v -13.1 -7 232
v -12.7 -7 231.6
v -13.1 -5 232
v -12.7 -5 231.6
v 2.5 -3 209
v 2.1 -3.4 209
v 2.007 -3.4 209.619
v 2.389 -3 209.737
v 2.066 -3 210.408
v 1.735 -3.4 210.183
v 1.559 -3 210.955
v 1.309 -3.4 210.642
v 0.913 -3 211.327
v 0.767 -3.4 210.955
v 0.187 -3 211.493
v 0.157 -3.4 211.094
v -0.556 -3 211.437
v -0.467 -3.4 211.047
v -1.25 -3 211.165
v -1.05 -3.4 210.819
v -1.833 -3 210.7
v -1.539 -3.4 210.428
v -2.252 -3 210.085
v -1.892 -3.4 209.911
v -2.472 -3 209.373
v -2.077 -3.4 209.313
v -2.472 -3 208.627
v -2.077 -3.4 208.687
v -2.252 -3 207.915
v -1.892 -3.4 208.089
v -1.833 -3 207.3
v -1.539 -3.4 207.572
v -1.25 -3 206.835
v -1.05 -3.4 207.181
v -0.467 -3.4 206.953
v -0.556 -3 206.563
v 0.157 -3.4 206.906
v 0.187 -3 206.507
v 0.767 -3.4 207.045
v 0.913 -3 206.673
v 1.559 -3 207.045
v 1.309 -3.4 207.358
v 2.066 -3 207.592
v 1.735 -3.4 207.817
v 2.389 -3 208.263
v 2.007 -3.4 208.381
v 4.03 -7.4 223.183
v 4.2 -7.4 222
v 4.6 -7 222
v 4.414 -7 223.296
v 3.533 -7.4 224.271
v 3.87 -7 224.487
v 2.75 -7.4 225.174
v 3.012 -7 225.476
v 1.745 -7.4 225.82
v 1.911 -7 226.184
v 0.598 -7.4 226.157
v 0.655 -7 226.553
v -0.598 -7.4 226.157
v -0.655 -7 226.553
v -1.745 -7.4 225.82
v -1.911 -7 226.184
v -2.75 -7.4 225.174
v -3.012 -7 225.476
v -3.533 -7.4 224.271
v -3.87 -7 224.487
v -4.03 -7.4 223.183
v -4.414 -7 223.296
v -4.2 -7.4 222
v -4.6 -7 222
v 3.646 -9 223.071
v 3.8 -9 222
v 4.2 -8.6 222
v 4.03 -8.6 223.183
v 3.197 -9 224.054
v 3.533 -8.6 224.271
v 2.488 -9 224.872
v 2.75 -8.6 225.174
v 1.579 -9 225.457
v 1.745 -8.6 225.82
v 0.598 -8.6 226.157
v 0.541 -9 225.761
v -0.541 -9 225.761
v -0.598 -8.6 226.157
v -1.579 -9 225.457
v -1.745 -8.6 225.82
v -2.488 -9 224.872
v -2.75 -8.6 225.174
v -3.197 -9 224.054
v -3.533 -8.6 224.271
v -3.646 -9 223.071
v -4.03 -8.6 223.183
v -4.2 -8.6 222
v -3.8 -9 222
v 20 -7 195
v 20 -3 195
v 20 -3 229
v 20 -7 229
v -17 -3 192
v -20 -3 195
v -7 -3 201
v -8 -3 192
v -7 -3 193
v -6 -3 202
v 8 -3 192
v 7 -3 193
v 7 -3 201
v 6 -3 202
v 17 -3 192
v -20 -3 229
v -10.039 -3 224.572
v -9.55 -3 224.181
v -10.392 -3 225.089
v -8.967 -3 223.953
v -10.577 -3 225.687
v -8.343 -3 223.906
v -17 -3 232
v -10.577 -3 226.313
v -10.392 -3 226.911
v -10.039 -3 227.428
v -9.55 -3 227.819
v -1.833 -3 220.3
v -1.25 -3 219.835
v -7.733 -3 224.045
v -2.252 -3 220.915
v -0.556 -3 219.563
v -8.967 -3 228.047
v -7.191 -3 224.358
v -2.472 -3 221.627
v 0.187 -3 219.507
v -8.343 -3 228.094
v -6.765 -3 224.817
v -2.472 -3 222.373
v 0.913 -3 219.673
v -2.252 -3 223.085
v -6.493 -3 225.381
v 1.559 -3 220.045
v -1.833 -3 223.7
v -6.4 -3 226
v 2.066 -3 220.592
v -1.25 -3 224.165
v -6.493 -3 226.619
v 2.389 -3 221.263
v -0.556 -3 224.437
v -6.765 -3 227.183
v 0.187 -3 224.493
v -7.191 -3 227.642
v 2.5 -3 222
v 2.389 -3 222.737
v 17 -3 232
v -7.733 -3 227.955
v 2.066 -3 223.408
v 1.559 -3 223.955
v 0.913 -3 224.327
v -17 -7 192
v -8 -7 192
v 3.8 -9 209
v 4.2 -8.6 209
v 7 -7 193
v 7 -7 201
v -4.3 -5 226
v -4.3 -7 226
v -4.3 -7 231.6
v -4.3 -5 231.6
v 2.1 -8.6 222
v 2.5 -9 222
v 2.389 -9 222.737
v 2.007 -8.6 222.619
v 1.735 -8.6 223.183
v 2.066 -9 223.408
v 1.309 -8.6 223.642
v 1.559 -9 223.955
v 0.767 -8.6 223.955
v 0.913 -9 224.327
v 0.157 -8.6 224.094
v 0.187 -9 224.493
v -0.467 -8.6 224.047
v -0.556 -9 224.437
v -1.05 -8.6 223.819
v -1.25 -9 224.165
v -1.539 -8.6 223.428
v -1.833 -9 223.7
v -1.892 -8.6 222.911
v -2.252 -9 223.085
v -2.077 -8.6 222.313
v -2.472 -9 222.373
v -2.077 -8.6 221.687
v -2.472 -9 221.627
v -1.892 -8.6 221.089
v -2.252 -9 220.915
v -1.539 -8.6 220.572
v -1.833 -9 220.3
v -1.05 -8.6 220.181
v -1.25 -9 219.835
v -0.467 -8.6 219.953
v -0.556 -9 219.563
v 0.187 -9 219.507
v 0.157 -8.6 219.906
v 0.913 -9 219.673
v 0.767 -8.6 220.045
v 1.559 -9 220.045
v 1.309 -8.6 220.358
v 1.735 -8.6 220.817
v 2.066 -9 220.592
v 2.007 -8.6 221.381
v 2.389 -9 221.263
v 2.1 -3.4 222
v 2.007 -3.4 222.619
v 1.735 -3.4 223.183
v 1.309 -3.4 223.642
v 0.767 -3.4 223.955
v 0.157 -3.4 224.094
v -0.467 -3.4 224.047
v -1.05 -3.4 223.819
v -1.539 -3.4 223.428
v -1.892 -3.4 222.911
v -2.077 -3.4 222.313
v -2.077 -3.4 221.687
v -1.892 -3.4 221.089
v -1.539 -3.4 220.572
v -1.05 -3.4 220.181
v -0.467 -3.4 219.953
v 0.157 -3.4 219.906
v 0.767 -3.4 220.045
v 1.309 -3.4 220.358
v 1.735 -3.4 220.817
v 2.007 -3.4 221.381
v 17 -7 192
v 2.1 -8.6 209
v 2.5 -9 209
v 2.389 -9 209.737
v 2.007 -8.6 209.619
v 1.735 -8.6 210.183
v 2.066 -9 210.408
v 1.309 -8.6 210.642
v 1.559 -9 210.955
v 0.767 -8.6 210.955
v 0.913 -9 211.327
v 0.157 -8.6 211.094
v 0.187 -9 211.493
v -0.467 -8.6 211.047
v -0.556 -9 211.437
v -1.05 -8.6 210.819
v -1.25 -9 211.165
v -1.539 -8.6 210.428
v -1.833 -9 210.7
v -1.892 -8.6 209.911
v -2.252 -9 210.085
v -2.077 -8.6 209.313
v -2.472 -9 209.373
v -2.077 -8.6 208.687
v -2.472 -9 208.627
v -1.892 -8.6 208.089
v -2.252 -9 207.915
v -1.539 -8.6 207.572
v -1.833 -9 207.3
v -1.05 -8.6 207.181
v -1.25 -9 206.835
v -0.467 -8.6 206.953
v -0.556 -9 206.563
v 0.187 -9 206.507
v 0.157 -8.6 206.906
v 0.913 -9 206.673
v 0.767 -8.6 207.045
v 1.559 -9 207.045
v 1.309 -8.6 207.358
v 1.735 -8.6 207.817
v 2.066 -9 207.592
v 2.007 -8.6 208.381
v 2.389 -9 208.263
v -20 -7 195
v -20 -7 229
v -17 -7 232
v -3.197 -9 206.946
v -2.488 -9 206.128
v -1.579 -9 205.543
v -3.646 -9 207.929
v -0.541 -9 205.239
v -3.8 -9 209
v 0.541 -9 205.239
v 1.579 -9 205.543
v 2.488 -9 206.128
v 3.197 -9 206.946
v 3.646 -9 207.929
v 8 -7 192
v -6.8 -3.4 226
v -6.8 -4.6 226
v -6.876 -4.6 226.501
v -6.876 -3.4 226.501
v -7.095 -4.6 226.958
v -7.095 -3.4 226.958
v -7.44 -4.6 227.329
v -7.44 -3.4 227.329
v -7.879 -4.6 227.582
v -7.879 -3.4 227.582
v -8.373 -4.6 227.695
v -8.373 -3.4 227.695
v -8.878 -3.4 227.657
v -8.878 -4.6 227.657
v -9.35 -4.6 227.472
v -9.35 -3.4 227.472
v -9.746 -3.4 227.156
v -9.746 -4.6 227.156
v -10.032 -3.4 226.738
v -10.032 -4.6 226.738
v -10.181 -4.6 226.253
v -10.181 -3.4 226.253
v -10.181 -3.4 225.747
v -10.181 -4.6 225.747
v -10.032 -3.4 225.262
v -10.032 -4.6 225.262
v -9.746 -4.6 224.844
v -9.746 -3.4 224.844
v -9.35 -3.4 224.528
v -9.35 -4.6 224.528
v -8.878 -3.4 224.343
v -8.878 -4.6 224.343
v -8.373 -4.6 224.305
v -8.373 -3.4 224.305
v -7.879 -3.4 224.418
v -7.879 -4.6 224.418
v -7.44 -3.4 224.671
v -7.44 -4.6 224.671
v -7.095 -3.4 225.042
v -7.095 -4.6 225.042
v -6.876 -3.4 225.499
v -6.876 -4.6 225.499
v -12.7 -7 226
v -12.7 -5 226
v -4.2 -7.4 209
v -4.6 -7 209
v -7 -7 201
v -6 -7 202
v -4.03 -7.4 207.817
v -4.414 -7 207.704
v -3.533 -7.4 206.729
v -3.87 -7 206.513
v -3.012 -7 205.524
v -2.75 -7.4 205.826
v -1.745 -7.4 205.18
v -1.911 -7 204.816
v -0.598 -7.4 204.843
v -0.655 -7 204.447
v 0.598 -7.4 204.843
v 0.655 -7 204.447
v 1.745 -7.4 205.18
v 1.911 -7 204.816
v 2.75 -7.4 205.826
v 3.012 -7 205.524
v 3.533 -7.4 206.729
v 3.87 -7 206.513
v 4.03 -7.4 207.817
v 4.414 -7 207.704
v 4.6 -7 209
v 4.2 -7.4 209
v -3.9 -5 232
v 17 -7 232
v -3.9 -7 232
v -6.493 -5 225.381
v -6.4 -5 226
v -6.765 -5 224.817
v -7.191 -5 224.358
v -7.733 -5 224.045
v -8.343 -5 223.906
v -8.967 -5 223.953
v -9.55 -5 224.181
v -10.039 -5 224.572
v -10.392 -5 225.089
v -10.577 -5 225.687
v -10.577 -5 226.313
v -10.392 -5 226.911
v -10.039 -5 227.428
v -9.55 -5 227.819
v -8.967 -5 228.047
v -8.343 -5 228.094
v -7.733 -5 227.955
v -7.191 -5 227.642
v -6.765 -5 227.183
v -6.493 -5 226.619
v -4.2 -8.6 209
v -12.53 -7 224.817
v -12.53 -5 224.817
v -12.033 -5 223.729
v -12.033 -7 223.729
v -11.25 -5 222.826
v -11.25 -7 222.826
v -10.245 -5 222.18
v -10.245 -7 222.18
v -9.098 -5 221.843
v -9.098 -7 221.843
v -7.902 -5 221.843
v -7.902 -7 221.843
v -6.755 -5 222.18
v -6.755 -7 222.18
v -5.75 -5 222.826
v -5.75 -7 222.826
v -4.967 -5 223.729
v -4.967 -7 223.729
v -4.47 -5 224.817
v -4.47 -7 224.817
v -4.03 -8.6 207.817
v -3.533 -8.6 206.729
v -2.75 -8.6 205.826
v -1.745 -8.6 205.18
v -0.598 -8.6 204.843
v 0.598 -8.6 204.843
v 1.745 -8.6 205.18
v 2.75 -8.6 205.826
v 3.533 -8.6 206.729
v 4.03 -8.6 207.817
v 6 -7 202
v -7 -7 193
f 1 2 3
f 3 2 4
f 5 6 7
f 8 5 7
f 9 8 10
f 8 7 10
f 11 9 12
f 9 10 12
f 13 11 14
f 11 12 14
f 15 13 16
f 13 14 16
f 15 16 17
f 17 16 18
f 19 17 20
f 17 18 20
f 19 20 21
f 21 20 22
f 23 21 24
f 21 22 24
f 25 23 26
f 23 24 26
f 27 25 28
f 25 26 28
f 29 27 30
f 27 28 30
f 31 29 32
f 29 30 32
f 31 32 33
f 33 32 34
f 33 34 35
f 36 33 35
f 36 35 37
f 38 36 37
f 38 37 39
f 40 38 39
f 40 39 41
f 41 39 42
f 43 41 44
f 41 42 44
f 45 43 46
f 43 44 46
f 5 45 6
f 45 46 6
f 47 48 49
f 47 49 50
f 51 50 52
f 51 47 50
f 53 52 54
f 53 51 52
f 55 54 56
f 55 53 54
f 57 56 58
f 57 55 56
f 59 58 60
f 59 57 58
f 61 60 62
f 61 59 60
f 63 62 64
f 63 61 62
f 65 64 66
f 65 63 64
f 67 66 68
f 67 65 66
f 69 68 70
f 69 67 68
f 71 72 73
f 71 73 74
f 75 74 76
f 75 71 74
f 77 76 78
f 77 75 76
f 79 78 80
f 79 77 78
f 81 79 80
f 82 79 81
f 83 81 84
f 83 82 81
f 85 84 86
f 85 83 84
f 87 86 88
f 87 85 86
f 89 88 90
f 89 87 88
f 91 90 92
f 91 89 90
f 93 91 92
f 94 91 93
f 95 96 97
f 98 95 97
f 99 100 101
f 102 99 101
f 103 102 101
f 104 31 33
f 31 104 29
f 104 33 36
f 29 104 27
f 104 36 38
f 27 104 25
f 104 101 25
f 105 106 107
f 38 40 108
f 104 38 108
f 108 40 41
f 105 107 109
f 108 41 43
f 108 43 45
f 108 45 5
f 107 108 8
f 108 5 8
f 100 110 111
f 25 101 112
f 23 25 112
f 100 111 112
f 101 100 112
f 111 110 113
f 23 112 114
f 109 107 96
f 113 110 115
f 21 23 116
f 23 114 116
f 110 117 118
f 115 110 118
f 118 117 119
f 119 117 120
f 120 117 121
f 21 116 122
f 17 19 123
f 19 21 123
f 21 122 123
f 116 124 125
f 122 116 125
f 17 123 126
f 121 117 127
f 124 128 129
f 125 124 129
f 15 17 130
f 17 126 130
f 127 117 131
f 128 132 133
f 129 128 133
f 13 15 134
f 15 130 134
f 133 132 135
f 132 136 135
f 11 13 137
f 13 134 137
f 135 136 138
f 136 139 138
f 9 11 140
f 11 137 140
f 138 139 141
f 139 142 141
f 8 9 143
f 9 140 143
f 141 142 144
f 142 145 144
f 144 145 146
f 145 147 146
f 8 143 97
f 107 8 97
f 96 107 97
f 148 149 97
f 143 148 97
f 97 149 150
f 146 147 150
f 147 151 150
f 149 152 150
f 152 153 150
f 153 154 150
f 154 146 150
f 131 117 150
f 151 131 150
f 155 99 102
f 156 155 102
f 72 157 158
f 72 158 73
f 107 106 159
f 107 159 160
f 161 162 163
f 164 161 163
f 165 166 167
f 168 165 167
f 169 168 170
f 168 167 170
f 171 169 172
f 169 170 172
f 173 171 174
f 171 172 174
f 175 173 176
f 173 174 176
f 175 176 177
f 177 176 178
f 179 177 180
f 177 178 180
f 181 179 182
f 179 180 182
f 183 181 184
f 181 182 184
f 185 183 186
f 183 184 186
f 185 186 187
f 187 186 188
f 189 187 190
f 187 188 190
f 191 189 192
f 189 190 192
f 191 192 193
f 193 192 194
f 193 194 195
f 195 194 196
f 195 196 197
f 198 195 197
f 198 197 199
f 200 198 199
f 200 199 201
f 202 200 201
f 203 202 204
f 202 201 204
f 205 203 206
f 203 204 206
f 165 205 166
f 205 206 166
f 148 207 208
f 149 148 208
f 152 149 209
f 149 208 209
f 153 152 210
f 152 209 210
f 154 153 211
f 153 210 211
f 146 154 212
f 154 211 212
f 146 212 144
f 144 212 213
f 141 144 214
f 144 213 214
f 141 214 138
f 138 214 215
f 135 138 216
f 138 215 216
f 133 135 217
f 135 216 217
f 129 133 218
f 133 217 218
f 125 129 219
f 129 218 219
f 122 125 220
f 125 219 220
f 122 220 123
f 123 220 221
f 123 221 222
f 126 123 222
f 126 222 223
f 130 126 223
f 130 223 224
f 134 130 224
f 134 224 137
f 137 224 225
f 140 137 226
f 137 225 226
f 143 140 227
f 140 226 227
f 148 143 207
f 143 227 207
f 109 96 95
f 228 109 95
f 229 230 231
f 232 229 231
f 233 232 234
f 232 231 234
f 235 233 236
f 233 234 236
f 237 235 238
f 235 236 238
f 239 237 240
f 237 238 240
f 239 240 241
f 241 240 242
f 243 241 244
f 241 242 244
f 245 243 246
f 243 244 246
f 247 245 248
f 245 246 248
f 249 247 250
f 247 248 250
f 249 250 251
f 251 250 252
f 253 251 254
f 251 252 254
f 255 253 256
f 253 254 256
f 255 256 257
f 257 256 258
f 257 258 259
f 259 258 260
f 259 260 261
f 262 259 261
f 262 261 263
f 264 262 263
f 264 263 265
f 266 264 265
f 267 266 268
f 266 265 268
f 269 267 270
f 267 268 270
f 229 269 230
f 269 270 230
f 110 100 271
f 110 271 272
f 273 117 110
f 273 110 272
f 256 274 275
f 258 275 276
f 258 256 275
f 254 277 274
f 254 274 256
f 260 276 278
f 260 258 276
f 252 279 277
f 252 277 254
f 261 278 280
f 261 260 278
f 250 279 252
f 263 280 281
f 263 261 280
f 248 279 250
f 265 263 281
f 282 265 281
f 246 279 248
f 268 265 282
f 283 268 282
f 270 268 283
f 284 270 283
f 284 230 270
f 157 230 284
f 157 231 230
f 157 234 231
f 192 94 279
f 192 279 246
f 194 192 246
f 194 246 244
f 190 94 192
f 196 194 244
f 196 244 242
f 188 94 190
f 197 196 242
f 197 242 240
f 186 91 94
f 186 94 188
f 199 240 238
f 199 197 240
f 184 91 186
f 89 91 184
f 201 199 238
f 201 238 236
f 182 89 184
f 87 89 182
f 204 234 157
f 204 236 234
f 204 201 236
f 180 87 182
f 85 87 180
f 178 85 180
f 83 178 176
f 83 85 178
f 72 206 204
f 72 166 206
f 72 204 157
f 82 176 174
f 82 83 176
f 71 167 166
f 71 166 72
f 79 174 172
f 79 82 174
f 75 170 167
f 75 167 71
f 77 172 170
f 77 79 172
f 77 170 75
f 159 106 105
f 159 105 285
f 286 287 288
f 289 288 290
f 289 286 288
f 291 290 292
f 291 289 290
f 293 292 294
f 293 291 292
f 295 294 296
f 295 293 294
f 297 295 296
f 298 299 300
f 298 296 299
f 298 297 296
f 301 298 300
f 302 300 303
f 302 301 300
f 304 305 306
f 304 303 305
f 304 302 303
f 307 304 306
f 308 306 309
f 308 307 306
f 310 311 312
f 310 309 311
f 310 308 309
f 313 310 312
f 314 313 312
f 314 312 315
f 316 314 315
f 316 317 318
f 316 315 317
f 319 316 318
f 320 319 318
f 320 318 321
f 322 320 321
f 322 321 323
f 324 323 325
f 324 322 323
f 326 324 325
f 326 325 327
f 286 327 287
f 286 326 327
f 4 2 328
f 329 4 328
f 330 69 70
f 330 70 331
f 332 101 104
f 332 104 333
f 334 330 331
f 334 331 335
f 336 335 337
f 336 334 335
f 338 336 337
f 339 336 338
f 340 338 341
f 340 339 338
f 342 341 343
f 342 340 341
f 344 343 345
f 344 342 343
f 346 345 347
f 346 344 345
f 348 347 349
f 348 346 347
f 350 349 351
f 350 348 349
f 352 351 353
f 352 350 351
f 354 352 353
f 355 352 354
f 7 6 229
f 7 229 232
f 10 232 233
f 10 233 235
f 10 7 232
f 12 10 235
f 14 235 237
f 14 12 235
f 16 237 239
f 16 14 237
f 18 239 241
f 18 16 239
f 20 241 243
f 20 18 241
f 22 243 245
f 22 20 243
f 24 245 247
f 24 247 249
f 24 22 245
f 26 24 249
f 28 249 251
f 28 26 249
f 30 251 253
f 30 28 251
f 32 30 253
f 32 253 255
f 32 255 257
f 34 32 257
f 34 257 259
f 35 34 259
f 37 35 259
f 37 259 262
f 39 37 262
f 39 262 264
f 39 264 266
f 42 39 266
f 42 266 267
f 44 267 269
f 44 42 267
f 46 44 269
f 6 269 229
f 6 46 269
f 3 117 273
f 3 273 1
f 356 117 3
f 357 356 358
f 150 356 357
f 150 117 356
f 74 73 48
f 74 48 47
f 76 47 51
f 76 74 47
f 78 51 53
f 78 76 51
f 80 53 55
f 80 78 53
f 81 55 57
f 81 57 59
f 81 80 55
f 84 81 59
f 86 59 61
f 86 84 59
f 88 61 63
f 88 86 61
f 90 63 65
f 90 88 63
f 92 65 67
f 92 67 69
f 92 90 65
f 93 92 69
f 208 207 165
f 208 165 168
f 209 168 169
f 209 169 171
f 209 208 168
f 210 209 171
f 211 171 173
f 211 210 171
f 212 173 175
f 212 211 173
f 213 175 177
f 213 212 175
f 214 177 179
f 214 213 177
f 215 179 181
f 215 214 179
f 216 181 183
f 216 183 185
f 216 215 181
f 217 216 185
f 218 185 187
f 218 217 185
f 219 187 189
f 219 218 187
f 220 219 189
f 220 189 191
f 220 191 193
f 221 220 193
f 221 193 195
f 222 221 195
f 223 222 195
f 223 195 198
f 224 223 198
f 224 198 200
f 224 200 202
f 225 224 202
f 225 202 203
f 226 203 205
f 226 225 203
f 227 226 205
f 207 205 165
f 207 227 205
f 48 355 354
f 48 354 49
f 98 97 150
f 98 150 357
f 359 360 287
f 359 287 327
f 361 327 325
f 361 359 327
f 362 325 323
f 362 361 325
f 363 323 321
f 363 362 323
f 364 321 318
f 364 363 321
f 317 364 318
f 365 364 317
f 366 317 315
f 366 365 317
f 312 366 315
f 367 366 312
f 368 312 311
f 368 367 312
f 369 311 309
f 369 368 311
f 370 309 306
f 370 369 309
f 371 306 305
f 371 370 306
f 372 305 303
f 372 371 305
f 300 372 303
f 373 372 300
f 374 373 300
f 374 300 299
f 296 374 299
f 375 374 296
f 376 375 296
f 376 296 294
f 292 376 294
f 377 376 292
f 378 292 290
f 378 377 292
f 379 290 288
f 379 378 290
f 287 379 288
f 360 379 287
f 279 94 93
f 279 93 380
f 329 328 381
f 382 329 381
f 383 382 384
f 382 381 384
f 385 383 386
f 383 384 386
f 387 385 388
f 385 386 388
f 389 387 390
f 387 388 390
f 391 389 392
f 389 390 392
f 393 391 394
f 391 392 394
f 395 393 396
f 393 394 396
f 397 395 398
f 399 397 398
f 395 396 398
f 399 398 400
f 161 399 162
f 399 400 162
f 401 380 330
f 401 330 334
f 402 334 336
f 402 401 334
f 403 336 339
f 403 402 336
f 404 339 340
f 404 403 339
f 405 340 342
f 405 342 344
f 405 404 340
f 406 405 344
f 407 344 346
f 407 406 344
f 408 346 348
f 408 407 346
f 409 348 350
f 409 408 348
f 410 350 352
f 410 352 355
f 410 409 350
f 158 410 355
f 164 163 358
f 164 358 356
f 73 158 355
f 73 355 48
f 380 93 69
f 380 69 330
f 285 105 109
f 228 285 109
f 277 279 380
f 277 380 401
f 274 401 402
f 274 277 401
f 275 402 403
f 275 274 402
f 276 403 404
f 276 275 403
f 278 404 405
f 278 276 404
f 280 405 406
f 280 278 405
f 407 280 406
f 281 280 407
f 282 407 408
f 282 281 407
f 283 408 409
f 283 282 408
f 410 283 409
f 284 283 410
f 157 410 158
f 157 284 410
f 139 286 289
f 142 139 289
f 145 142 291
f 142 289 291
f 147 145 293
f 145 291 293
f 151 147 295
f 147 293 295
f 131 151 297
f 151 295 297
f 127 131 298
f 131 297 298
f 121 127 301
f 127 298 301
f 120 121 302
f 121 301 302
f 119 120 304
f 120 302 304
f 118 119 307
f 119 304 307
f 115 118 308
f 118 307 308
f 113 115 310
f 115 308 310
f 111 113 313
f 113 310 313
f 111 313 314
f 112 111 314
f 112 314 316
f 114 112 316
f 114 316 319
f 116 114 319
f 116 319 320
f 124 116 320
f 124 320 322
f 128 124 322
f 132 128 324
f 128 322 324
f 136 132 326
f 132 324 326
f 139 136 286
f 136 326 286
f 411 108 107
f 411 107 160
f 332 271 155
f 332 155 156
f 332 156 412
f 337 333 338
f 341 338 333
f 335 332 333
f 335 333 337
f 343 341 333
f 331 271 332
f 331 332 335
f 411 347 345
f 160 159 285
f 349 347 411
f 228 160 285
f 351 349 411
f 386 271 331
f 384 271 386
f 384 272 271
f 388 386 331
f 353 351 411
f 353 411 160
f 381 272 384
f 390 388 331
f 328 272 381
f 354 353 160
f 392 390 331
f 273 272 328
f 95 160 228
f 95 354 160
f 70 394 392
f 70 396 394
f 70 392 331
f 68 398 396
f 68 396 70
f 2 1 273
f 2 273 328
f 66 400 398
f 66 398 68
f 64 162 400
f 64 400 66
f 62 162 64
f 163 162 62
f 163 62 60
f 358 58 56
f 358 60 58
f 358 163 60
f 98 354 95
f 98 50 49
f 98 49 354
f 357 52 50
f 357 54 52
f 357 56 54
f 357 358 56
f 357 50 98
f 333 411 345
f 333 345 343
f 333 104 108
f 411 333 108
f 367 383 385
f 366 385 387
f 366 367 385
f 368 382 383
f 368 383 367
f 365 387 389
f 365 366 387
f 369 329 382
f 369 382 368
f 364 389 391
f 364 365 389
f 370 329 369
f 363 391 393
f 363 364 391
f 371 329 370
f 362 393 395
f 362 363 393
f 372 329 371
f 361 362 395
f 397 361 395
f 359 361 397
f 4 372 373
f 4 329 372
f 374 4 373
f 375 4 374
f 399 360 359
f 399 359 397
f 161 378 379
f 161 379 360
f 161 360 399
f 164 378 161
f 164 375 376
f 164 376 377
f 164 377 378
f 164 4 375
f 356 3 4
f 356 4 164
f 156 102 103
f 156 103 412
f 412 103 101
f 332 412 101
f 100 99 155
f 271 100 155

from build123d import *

# Parameters (mm, degrees)
SKETCH120_W     = 40
SKETCH120_H     = 40
SKETCH120_R     = 1.7
SKETCH120_R_2   = 2.1
PAD062_DEPTH    = 6
CHAMFER017_SIZE = 3
POCKET021_DEPTH = 4
SKETCH122_W     = 44.906031
SKETCH122_H     = 45.853912
POCKET022_DEPTH = 2
CHAMFER018_SIZE = 0.4
SKETCH123_W     = 14
SKETCH123_H     = 10
POCKET023_DEPTH = 6.001
CHAMFER019_SIZE = 1


with BuildPart() as part:
    # Sketch120 → Pad062 (new body)
    with BuildSketch(Plane.XZ):
        with Locations((0, 20)):
            Rectangle(SKETCH120_W, SKETCH120_H)
        with Locations((-8.5, 34)):
            Circle(SKETCH120_R, mode=Mode.SUBTRACT)
        with Locations((0, 30)):
            Circle(SKETCH120_R_2, mode=Mode.SUBTRACT)
        with Locations((0, 17)):
            Circle(SKETCH120_R_2, mode=Mode.SUBTRACT)
    extrude(amount=PAD062_DEPTH)

    # Chamfer017
    chamfer017_edges = [part.edges().sort_by_distance(p)[0] for p in [
        (-20, -3, 40),
        (20, -3, 40),
        (20, -3, 0),
        (-20, -3, 0),
    ]]
    chamfer(chamfer017_edges, length=CHAMFER017_SIZE)

    # Sketch121 (on Face5 of Chamfer017) → Pocket021 (cut)
    with BuildSketch(Plane.XZ.offset(6)):
        with BuildLine():
            ThreePointArc((-12.7, 34), (-8.5, 29.8), (-4.3, 34))
            Line((-4.3, 34), (-4.3, 40))
            ThreePointArc((-4.3, 40), (-8.5, 44.2), (-12.7, 40))
            Line((-12.7, 40), (-12.7, 34))
        make_face()
    extrude(amount=-POCKET021_DEPTH, mode=Mode.SUBTRACT)

    # Sketch122 (on Face5 of Pocket021) → Pocket022 (cut)
    with BuildSketch(Plane.XZ.offset(6)):
        with Locations((-0.23733, 20.575699)):
            Rectangle(SKETCH122_W, SKETCH122_H)
        with BuildLine():
            ThreePointArc((4.2, 30), (0, 34.2), (-4.2, 30))
            Line((-4.2, 30), (-4.2, 17))
            ThreePointArc((-4.2, 17), (0, 12.8), (4.2, 17))
            Line((4.2, 17), (4.2, 30))
        make_face(mode=Mode.SUBTRACT)
    extrude(amount=-POCKET022_DEPTH, mode=Mode.SUBTRACT)

    # Chamfer018
    chamfer018_edges = [part.edges().sort_by_distance(p)[0] for p in [
        (-10.2, -2, 34),
        (-2.1, -6, 30),
        (-2.1, -6, 17),
        (-2.1, 0, 17),
        (-2.1, 0, 30),
        (-10.2, 0, 34),
        (0, -6, 34.2),
        (0, -4, 34.2),
        (-4.3, -3, 40),
        (-12.7, -3, 40),
    ]]
    chamfer(chamfer018_edges, length=CHAMFER018_SIZE)

    # Sketch123 → Pocket023 (cut, through all)
    with BuildSketch(Plane.XZ):
        with Locations((0, 5)):
            Rectangle(SKETCH123_W, SKETCH123_H)
    extrude(amount=POCKET023_DEPTH, mode=Mode.SUBTRACT)

    # Chamfer019
    chamfer019_edges = [part.edges().sort_by_distance(p)[0] for p in [
        (7, -2, 10),
        (-7, -2, 10),
        (7, -2, 0),
        (-7, -2, 0),
    ]]
    chamfer(chamfer019_edges, length=CHAMFER019_SIZE)


with BuildPart() as part_1:
    # Body053 placement: moved
    add(part.part.moved(Location((0, -3, 192))))


solid = part_1.part
